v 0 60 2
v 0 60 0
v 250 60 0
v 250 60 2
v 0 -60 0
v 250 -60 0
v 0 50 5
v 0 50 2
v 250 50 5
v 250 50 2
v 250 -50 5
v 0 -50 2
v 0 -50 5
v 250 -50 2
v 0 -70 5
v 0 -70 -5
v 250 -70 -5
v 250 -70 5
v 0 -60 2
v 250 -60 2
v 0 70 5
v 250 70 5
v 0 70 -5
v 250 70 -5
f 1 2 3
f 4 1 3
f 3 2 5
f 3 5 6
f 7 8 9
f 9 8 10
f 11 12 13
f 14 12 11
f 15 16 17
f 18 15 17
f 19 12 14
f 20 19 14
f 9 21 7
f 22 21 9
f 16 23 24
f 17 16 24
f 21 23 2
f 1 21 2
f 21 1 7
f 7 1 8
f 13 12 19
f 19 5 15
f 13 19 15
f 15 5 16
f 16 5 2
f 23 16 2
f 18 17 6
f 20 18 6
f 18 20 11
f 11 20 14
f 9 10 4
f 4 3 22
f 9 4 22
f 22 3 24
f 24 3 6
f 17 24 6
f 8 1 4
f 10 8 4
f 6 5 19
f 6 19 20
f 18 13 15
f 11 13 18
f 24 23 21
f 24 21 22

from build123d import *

# Parameters (mm, degrees)
BOSS_EXTRUDE1_DEPTH      = 5
BOSS_EXTRUDE1_DEPTH_BACK = 5
SKETCH1_W                = 250
SKETCH1_H                = 140
SKETCH1_3_W              = 250
SKETCH1_3_H              = 100
CUT_EXTRUDE1_DEPTH       = 260.663243452
SKETCH1_4_W              = 250
SKETCH1_4_H              = 10
CUT_EXTRUDE2_DEPTH       = 2


with BuildPart() as part:
    # Sketch1 → Boss-Extrude1 (new, two sides: drawn at the far end of the back side and taken through both)
    with BuildSketch(Plane.XY.offset(-BOSS_EXTRUDE1_DEPTH_BACK)):
        with Locations((125, 0)):
            Rectangle(SKETCH1_W, SKETCH1_H)
    extrude(amount=BOSS_EXTRUDE1_DEPTH + BOSS_EXTRUDE1_DEPTH_BACK)

    # Sketch1<3> → Cut-Extrude1 (cut, through all)
    with BuildSketch(Plane.XY):
        with Locations((125, 0)):
            Rectangle(SKETCH1_3_W, SKETCH1_3_H)
    extrude(amount=CUT_EXTRUDE1_DEPTH, mode=Mode.SUBTRACT)

    # Sketch1<4> → Cut-Extrude2 (cut)
    with BuildSketch(Plane.XY):
        with Locations((125, 55)):
            Rectangle(SKETCH1_4_W, SKETCH1_4_H)
        with Locations((125, -55)):
            Rectangle(SKETCH1_4_W, SKETCH1_4_H)
    extrude(amount=CUT_EXTRUDE2_DEPTH, mode=Mode.SUBTRACT)


solid = part.part
